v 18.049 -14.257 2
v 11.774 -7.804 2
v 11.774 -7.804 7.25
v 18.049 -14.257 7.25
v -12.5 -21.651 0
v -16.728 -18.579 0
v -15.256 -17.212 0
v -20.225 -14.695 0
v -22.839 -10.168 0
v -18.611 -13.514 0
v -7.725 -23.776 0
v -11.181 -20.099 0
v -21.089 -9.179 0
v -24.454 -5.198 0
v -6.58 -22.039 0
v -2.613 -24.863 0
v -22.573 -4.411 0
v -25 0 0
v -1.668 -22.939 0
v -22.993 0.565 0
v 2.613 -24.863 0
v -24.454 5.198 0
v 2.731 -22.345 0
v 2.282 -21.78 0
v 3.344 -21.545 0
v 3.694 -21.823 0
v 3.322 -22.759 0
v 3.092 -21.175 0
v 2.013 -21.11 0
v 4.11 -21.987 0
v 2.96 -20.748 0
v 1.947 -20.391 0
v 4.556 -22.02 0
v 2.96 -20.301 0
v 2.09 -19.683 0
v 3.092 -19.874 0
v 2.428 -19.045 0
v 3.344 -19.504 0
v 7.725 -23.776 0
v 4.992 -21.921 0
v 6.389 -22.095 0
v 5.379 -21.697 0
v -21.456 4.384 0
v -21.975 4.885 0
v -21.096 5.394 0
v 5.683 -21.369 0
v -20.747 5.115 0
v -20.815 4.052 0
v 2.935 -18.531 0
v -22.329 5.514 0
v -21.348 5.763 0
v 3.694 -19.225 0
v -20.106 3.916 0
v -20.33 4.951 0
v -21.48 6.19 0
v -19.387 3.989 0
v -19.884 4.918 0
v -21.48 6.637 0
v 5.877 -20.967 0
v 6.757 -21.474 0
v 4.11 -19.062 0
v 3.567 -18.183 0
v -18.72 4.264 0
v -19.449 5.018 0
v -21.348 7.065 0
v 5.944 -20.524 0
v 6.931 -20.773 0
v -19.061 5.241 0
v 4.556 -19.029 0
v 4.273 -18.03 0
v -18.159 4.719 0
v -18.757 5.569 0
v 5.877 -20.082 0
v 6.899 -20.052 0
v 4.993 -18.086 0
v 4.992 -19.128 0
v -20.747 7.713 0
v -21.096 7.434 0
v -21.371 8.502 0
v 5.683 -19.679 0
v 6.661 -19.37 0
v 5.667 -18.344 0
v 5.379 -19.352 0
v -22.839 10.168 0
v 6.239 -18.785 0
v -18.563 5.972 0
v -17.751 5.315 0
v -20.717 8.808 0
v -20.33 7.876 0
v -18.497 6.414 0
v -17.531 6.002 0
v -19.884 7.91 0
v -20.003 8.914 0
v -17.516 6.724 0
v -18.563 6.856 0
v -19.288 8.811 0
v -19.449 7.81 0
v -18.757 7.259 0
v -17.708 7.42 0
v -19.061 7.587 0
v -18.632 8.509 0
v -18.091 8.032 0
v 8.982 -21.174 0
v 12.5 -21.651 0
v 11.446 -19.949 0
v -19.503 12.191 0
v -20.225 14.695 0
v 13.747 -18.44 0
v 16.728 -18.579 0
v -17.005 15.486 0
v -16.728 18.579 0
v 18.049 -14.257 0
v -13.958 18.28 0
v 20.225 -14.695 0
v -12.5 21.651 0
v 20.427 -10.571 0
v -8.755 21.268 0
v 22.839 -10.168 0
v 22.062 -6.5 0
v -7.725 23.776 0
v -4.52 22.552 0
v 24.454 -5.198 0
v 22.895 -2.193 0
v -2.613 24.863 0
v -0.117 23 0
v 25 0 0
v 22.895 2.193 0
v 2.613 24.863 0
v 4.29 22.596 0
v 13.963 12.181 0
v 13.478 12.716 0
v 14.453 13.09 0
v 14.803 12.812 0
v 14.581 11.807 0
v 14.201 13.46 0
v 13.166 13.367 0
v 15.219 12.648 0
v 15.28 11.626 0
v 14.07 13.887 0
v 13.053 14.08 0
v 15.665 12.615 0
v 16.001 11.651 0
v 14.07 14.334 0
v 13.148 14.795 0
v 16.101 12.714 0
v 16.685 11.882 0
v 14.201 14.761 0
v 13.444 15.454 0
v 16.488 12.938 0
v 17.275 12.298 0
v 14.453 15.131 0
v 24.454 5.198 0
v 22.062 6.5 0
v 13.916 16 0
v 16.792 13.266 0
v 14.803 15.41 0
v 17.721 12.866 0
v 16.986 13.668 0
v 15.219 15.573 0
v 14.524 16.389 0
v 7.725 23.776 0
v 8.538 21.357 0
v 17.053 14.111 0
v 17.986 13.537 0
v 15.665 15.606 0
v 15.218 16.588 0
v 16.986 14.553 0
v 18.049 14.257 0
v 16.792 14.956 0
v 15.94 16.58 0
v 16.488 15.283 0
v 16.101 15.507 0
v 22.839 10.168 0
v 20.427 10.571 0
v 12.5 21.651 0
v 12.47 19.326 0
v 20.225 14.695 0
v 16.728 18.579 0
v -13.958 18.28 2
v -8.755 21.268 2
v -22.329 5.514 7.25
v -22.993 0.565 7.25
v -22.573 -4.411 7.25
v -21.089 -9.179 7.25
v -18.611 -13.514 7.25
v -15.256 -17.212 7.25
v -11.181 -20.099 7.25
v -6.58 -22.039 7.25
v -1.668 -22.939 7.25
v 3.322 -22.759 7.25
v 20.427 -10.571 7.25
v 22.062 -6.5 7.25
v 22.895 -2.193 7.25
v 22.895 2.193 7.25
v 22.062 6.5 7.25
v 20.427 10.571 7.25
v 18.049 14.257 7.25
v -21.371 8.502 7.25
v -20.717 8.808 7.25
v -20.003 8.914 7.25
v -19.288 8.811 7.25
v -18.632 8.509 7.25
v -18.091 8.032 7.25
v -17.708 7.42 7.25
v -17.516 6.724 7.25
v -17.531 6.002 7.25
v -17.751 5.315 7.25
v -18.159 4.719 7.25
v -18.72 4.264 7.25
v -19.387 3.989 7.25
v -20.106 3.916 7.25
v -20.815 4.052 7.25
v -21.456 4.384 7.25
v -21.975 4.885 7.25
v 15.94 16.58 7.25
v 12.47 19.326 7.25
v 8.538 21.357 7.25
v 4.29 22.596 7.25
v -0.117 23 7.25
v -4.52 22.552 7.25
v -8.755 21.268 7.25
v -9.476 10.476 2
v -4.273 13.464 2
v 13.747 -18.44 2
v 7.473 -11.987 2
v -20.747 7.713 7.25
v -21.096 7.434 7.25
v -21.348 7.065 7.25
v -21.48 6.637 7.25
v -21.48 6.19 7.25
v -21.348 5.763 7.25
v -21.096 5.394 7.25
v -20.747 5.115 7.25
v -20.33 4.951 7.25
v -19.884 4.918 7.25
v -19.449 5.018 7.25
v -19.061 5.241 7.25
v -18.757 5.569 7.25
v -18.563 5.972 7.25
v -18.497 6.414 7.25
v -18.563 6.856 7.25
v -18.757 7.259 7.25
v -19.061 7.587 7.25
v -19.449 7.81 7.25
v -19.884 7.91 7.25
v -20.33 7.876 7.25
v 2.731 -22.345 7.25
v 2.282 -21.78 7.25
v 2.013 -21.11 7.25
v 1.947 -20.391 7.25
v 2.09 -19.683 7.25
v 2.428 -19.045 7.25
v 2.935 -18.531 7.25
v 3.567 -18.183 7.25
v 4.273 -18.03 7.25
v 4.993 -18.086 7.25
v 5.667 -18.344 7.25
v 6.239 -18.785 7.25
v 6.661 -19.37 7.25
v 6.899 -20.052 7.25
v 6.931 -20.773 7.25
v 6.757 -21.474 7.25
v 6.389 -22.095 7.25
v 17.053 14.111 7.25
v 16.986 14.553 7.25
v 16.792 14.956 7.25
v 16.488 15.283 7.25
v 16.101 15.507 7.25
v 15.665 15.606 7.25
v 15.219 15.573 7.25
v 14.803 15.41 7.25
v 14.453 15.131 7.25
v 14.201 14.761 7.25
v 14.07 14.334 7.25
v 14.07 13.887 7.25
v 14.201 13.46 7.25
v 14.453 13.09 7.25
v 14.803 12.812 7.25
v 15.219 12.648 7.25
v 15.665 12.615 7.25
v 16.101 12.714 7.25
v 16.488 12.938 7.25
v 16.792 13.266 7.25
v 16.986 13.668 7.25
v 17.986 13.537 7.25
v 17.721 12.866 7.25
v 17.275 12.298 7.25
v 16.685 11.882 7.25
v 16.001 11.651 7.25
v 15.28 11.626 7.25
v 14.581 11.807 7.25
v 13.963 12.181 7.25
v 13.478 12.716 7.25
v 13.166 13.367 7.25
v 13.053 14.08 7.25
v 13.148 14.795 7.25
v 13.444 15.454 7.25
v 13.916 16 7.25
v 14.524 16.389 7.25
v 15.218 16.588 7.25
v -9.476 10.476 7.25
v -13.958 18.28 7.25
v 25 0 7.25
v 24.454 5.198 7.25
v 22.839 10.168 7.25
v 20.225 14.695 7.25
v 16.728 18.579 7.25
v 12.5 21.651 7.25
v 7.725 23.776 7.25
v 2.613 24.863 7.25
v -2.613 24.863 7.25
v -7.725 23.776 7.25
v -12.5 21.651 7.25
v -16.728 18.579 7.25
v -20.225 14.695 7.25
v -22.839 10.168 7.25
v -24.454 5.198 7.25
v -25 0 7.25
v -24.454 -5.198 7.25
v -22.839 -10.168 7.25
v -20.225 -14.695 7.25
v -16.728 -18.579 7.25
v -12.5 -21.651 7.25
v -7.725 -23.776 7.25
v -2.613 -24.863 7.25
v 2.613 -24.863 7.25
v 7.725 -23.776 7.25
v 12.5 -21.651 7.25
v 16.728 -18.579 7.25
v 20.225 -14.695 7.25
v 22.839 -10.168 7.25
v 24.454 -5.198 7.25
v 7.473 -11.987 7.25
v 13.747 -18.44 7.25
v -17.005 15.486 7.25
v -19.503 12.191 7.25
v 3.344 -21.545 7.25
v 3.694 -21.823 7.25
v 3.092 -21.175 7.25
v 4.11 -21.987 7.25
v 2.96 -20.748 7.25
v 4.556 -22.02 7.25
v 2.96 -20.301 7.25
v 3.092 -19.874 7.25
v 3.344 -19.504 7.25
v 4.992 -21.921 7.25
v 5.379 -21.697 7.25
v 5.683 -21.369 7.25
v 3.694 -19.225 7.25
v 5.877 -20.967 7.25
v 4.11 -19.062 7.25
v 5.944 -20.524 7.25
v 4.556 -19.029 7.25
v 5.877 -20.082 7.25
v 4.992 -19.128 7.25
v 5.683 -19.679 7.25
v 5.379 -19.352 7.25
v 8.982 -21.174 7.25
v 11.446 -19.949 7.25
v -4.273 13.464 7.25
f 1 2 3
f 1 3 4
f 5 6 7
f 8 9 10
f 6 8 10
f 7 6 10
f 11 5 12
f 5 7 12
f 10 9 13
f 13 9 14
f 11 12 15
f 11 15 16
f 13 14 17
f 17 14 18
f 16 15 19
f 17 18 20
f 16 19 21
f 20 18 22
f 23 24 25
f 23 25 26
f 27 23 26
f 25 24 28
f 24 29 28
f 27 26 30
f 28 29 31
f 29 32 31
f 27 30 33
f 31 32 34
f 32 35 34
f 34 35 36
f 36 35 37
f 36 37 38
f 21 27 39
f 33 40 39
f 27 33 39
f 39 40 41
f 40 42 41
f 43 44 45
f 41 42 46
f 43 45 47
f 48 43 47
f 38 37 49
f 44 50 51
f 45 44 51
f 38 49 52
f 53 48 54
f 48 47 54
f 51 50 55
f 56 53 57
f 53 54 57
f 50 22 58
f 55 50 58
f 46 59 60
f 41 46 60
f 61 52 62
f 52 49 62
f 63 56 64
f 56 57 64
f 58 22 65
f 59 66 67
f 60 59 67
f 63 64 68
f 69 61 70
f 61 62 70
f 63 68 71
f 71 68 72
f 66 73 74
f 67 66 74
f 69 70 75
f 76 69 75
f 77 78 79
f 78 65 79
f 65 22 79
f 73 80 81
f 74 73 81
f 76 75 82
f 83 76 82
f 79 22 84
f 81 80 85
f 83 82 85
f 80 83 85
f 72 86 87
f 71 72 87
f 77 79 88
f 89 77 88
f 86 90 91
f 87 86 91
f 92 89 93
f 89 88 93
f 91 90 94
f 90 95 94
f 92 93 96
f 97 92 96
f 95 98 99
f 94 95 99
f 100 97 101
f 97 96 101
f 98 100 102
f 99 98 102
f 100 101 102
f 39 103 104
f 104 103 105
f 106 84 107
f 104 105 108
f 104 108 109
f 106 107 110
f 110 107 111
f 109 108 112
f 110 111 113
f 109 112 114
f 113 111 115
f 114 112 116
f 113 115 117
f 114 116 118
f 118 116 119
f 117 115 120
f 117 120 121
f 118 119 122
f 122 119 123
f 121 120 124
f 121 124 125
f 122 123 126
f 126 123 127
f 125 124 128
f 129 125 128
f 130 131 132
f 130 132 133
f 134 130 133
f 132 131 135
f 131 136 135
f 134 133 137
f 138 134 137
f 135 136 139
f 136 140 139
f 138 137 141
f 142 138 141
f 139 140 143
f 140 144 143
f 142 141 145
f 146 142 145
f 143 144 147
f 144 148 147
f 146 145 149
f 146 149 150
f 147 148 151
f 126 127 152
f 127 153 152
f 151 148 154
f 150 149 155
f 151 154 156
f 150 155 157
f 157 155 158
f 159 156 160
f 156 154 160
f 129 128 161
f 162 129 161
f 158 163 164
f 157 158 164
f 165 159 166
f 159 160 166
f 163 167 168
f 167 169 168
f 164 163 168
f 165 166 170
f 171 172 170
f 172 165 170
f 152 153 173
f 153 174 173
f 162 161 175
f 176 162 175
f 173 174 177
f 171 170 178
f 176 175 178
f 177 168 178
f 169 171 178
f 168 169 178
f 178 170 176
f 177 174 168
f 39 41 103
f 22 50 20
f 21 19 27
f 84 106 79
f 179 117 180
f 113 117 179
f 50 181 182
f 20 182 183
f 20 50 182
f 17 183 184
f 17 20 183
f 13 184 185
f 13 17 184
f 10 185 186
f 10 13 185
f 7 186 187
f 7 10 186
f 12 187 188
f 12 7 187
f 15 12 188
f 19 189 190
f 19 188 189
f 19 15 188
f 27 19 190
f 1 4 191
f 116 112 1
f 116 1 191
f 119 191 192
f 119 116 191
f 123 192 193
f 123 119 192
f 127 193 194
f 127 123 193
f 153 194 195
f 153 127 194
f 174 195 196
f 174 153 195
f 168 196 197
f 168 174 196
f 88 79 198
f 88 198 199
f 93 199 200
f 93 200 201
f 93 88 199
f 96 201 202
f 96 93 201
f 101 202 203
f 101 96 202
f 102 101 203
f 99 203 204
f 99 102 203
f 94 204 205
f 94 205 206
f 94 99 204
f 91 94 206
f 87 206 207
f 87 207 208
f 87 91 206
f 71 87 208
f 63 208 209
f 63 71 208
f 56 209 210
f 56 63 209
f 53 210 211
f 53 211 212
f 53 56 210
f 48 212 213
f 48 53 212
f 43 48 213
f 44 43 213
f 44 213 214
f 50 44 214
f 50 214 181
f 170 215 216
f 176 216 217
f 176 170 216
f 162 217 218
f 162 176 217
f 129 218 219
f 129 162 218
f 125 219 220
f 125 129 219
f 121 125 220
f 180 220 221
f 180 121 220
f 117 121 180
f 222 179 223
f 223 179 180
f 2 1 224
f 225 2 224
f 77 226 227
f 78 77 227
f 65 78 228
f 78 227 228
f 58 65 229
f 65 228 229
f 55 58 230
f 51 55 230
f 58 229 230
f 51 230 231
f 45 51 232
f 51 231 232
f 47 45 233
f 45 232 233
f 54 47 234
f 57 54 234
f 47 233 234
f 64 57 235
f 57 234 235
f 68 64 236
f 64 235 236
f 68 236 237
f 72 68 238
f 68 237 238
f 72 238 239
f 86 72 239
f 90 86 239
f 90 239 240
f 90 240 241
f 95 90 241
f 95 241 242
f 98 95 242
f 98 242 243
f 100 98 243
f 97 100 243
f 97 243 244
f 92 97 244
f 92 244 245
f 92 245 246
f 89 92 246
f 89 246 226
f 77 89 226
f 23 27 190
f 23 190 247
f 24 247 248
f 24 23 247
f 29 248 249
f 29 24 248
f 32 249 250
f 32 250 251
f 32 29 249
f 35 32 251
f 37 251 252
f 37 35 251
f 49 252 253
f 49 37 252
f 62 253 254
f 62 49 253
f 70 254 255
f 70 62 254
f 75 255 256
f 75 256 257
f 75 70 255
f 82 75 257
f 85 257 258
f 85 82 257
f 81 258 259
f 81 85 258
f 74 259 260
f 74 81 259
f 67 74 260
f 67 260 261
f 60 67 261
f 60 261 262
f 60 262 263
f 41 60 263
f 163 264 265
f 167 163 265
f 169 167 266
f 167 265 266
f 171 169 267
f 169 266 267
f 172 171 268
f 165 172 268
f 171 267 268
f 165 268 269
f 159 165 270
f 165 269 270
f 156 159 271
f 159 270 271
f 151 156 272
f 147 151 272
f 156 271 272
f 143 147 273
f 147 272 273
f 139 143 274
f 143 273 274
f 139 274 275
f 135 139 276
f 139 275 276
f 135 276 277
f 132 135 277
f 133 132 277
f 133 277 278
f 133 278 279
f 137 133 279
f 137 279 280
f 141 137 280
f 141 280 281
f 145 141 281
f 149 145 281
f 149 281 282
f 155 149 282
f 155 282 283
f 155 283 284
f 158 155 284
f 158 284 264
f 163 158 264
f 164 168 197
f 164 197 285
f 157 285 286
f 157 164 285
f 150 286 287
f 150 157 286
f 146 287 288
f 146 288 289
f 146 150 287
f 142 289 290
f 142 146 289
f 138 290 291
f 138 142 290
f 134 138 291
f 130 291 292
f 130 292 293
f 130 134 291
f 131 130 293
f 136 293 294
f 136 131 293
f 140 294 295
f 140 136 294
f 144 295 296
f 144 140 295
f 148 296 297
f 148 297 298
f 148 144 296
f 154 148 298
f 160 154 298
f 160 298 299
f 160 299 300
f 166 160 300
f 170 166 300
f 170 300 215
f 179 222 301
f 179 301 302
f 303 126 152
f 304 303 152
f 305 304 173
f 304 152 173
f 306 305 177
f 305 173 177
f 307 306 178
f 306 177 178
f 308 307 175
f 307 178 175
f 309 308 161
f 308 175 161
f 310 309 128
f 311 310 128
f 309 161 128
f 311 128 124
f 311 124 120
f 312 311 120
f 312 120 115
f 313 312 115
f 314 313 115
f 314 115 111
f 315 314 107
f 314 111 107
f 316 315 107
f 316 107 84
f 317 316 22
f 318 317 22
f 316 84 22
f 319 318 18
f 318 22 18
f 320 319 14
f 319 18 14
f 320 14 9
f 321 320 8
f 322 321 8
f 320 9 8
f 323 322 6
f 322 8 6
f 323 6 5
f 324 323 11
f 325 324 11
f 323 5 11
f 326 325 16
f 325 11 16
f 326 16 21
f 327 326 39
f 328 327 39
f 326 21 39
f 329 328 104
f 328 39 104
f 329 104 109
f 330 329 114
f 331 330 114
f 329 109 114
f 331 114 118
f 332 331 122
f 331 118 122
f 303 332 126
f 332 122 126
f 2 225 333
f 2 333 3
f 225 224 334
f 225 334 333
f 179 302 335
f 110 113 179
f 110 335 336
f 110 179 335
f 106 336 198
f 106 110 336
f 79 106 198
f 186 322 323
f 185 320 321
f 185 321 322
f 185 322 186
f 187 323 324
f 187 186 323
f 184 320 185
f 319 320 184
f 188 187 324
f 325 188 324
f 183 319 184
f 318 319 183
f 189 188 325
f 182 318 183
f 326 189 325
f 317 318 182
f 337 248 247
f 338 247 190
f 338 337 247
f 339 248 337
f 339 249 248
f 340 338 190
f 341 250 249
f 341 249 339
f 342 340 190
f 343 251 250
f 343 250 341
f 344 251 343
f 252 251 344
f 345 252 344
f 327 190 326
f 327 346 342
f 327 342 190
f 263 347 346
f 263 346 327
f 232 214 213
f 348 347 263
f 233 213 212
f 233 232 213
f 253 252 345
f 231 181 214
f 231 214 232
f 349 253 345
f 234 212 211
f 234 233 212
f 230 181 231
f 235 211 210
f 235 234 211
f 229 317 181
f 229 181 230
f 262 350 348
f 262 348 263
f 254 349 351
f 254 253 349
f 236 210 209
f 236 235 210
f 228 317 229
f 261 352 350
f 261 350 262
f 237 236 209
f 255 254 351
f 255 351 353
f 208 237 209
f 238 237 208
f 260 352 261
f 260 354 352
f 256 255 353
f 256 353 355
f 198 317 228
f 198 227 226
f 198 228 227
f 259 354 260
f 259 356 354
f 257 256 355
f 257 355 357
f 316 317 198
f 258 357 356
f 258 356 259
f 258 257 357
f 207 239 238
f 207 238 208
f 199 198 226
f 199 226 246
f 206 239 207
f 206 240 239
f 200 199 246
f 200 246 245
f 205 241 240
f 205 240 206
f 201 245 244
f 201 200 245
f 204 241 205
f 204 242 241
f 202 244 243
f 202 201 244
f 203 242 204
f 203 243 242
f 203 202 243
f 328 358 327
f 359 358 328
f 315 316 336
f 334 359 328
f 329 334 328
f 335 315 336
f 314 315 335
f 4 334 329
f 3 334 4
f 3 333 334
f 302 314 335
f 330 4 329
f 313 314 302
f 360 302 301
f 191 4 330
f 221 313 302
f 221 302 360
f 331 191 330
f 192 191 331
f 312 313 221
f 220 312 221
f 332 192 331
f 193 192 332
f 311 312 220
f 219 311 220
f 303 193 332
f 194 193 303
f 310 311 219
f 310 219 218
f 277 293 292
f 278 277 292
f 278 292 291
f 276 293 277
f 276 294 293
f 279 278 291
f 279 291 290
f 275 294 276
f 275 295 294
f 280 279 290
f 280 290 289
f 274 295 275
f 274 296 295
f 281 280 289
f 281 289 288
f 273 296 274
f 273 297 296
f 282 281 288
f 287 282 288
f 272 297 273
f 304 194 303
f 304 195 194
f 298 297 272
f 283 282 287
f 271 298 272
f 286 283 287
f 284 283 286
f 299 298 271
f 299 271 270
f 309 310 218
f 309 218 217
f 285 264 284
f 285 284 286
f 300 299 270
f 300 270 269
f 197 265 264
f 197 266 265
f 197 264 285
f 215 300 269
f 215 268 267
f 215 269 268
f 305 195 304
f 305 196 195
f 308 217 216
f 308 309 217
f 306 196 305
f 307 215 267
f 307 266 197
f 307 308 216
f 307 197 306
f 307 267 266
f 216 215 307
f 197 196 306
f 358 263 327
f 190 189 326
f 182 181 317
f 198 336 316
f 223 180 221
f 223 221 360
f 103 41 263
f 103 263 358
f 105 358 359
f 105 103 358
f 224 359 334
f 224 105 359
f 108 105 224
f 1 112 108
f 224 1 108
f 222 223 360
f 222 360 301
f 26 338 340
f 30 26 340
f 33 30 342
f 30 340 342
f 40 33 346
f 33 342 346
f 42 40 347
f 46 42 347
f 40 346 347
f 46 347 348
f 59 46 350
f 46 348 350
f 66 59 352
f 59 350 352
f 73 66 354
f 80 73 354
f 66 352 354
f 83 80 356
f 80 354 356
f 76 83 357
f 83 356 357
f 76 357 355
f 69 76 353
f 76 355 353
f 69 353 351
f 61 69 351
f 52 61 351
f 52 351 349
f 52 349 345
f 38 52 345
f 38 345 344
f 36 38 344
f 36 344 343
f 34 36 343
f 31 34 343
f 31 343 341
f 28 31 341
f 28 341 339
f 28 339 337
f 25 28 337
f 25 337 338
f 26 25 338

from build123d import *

# Parameters (mm, degrees)
SKETCH1_R             = 25
BOSS_EXTRUDE1_DEPTH   = 7.25
F_3_0MM_DOWEL_HOLE1_D = 3
CIRPATTERN1_COUNT     = 3
CUT_EXTRUDE7_DEPTH    = 8.25
CUT_EXTRUDE9_DEPTH    = 2


with BuildPart() as part:
    # Sketch1 → Boss-Extrude1 (new body)
    with BuildSketch(Plane.XY):
        Circle(SKETCH1_R)
    extrude(amount=BOSS_EXTRUDE1_DEPTH)

    # Ø3.0mm Dowel Hole1 (through all)
    with Locations(Plane(origin=(0, 0, 0), x_dir=(-1, 0, 0), z_dir=(0, 0, -1))):
        with Locations((-15.552844037, 14.110600354)):
            f_3_0mm_dowel_hole1 = Hole(F_3_0MM_DOWEL_HOLE1_D / 2)

    # CirPattern1: Ø3.0mm Dowel Hole1 ×3 about axis
    cirpattern1_axis = Axis((0, 0, 0), (0, 0, 1))
    for i in range(1, CIRPATTERN1_COUNT):
        add(f_3_0mm_dowel_hole1.rotate(cirpattern1_axis, i * 360 / CIRPATTERN1_COUNT), mode=Mode.SUBTRACT)

    # Sketch4 → Cut-Extrude7 (cut, through all)
    with BuildSketch(Plane(origin=(0, 0, 0), x_dir=(-1, 0, 0), z_dir=(0, 0, -1))):
        with BuildLine():
            Line((8.755064083, 21.268494373), (4.272899712, 13.463995507))
            Line((4.272899712, 13.463995507), (9.475898956, 10.475885926))
            Line((9.475898956, 10.475885926), (13.958063327, 18.280384792))
            ThreePointArc((13.958063327, 18.280384792), (18.328536057, 13.894774774), (21.370809866, 8.502263561))
            ThreePointArc((21.370809866, 8.502263561), (17.616017485, 5.650303353), (22.329156288, 5.514415606))
            ThreePointArc((22.329156288, 5.514415606), (17.034067279, -15.454467055), (-3.3222287, -22.758796024))
            ThreePointArc((-3.3222287, -22.758796024), (-3.9147025, -18.081070332), (-6.388954142, -22.094824393))
            ThreePointArc((-6.388954142, -22.094824393), (-10.232582573, -20.598404159), (-13.747128962, -18.439534845))
            Line((-13.747128962, -18.439534845), (-7.472625388, -11.987356538))
            Line((-7.472625388, -11.987356538), (-11.774077593, -7.804354156))
            Line((-11.774077593, -7.804354156), (-18.048581167, -14.256532463))
            ThreePointArc((-18.048581167, -14.256532463), (-23, 0), (-18.048581167, 14.256532463))
            ThreePointArc((-18.048581167, 14.256532463), (-13.701314985, 12.430766979), (-15.940202146, 16.580408787))
            ThreePointArc((-15.940202146, 16.580408787), (-4.289649037, 22.596435806), (8.755064083, 21.268494373))
        make_face()
    extrude(amount=-CUT_EXTRUDE7_DEPTH, mode=Mode.SUBTRACT)

    # Sketch9 → Cut-Extrude9 (cut)
    with BuildSketch(Plane(origin=(0, 0, 0), x_dir=(-1, 0, 0), z_dir=(0, 0, -1))):
        Polygon((-11.774077593, -7.804354156), (-18.048581167, -14.256532463), (-13.747128962, -18.439534845), (-7.472625388, -11.987356538), align=None)
        Polygon((4.272899712, 13.463995507), (8.755064083, 21.268494373), (13.958063327, 18.280384792), (9.475898956, 10.475885926), align=None)
    extrude(amount=-CUT_EXTRUDE9_DEPTH, mode=Mode.SUBTRACT)


solid = part.part
